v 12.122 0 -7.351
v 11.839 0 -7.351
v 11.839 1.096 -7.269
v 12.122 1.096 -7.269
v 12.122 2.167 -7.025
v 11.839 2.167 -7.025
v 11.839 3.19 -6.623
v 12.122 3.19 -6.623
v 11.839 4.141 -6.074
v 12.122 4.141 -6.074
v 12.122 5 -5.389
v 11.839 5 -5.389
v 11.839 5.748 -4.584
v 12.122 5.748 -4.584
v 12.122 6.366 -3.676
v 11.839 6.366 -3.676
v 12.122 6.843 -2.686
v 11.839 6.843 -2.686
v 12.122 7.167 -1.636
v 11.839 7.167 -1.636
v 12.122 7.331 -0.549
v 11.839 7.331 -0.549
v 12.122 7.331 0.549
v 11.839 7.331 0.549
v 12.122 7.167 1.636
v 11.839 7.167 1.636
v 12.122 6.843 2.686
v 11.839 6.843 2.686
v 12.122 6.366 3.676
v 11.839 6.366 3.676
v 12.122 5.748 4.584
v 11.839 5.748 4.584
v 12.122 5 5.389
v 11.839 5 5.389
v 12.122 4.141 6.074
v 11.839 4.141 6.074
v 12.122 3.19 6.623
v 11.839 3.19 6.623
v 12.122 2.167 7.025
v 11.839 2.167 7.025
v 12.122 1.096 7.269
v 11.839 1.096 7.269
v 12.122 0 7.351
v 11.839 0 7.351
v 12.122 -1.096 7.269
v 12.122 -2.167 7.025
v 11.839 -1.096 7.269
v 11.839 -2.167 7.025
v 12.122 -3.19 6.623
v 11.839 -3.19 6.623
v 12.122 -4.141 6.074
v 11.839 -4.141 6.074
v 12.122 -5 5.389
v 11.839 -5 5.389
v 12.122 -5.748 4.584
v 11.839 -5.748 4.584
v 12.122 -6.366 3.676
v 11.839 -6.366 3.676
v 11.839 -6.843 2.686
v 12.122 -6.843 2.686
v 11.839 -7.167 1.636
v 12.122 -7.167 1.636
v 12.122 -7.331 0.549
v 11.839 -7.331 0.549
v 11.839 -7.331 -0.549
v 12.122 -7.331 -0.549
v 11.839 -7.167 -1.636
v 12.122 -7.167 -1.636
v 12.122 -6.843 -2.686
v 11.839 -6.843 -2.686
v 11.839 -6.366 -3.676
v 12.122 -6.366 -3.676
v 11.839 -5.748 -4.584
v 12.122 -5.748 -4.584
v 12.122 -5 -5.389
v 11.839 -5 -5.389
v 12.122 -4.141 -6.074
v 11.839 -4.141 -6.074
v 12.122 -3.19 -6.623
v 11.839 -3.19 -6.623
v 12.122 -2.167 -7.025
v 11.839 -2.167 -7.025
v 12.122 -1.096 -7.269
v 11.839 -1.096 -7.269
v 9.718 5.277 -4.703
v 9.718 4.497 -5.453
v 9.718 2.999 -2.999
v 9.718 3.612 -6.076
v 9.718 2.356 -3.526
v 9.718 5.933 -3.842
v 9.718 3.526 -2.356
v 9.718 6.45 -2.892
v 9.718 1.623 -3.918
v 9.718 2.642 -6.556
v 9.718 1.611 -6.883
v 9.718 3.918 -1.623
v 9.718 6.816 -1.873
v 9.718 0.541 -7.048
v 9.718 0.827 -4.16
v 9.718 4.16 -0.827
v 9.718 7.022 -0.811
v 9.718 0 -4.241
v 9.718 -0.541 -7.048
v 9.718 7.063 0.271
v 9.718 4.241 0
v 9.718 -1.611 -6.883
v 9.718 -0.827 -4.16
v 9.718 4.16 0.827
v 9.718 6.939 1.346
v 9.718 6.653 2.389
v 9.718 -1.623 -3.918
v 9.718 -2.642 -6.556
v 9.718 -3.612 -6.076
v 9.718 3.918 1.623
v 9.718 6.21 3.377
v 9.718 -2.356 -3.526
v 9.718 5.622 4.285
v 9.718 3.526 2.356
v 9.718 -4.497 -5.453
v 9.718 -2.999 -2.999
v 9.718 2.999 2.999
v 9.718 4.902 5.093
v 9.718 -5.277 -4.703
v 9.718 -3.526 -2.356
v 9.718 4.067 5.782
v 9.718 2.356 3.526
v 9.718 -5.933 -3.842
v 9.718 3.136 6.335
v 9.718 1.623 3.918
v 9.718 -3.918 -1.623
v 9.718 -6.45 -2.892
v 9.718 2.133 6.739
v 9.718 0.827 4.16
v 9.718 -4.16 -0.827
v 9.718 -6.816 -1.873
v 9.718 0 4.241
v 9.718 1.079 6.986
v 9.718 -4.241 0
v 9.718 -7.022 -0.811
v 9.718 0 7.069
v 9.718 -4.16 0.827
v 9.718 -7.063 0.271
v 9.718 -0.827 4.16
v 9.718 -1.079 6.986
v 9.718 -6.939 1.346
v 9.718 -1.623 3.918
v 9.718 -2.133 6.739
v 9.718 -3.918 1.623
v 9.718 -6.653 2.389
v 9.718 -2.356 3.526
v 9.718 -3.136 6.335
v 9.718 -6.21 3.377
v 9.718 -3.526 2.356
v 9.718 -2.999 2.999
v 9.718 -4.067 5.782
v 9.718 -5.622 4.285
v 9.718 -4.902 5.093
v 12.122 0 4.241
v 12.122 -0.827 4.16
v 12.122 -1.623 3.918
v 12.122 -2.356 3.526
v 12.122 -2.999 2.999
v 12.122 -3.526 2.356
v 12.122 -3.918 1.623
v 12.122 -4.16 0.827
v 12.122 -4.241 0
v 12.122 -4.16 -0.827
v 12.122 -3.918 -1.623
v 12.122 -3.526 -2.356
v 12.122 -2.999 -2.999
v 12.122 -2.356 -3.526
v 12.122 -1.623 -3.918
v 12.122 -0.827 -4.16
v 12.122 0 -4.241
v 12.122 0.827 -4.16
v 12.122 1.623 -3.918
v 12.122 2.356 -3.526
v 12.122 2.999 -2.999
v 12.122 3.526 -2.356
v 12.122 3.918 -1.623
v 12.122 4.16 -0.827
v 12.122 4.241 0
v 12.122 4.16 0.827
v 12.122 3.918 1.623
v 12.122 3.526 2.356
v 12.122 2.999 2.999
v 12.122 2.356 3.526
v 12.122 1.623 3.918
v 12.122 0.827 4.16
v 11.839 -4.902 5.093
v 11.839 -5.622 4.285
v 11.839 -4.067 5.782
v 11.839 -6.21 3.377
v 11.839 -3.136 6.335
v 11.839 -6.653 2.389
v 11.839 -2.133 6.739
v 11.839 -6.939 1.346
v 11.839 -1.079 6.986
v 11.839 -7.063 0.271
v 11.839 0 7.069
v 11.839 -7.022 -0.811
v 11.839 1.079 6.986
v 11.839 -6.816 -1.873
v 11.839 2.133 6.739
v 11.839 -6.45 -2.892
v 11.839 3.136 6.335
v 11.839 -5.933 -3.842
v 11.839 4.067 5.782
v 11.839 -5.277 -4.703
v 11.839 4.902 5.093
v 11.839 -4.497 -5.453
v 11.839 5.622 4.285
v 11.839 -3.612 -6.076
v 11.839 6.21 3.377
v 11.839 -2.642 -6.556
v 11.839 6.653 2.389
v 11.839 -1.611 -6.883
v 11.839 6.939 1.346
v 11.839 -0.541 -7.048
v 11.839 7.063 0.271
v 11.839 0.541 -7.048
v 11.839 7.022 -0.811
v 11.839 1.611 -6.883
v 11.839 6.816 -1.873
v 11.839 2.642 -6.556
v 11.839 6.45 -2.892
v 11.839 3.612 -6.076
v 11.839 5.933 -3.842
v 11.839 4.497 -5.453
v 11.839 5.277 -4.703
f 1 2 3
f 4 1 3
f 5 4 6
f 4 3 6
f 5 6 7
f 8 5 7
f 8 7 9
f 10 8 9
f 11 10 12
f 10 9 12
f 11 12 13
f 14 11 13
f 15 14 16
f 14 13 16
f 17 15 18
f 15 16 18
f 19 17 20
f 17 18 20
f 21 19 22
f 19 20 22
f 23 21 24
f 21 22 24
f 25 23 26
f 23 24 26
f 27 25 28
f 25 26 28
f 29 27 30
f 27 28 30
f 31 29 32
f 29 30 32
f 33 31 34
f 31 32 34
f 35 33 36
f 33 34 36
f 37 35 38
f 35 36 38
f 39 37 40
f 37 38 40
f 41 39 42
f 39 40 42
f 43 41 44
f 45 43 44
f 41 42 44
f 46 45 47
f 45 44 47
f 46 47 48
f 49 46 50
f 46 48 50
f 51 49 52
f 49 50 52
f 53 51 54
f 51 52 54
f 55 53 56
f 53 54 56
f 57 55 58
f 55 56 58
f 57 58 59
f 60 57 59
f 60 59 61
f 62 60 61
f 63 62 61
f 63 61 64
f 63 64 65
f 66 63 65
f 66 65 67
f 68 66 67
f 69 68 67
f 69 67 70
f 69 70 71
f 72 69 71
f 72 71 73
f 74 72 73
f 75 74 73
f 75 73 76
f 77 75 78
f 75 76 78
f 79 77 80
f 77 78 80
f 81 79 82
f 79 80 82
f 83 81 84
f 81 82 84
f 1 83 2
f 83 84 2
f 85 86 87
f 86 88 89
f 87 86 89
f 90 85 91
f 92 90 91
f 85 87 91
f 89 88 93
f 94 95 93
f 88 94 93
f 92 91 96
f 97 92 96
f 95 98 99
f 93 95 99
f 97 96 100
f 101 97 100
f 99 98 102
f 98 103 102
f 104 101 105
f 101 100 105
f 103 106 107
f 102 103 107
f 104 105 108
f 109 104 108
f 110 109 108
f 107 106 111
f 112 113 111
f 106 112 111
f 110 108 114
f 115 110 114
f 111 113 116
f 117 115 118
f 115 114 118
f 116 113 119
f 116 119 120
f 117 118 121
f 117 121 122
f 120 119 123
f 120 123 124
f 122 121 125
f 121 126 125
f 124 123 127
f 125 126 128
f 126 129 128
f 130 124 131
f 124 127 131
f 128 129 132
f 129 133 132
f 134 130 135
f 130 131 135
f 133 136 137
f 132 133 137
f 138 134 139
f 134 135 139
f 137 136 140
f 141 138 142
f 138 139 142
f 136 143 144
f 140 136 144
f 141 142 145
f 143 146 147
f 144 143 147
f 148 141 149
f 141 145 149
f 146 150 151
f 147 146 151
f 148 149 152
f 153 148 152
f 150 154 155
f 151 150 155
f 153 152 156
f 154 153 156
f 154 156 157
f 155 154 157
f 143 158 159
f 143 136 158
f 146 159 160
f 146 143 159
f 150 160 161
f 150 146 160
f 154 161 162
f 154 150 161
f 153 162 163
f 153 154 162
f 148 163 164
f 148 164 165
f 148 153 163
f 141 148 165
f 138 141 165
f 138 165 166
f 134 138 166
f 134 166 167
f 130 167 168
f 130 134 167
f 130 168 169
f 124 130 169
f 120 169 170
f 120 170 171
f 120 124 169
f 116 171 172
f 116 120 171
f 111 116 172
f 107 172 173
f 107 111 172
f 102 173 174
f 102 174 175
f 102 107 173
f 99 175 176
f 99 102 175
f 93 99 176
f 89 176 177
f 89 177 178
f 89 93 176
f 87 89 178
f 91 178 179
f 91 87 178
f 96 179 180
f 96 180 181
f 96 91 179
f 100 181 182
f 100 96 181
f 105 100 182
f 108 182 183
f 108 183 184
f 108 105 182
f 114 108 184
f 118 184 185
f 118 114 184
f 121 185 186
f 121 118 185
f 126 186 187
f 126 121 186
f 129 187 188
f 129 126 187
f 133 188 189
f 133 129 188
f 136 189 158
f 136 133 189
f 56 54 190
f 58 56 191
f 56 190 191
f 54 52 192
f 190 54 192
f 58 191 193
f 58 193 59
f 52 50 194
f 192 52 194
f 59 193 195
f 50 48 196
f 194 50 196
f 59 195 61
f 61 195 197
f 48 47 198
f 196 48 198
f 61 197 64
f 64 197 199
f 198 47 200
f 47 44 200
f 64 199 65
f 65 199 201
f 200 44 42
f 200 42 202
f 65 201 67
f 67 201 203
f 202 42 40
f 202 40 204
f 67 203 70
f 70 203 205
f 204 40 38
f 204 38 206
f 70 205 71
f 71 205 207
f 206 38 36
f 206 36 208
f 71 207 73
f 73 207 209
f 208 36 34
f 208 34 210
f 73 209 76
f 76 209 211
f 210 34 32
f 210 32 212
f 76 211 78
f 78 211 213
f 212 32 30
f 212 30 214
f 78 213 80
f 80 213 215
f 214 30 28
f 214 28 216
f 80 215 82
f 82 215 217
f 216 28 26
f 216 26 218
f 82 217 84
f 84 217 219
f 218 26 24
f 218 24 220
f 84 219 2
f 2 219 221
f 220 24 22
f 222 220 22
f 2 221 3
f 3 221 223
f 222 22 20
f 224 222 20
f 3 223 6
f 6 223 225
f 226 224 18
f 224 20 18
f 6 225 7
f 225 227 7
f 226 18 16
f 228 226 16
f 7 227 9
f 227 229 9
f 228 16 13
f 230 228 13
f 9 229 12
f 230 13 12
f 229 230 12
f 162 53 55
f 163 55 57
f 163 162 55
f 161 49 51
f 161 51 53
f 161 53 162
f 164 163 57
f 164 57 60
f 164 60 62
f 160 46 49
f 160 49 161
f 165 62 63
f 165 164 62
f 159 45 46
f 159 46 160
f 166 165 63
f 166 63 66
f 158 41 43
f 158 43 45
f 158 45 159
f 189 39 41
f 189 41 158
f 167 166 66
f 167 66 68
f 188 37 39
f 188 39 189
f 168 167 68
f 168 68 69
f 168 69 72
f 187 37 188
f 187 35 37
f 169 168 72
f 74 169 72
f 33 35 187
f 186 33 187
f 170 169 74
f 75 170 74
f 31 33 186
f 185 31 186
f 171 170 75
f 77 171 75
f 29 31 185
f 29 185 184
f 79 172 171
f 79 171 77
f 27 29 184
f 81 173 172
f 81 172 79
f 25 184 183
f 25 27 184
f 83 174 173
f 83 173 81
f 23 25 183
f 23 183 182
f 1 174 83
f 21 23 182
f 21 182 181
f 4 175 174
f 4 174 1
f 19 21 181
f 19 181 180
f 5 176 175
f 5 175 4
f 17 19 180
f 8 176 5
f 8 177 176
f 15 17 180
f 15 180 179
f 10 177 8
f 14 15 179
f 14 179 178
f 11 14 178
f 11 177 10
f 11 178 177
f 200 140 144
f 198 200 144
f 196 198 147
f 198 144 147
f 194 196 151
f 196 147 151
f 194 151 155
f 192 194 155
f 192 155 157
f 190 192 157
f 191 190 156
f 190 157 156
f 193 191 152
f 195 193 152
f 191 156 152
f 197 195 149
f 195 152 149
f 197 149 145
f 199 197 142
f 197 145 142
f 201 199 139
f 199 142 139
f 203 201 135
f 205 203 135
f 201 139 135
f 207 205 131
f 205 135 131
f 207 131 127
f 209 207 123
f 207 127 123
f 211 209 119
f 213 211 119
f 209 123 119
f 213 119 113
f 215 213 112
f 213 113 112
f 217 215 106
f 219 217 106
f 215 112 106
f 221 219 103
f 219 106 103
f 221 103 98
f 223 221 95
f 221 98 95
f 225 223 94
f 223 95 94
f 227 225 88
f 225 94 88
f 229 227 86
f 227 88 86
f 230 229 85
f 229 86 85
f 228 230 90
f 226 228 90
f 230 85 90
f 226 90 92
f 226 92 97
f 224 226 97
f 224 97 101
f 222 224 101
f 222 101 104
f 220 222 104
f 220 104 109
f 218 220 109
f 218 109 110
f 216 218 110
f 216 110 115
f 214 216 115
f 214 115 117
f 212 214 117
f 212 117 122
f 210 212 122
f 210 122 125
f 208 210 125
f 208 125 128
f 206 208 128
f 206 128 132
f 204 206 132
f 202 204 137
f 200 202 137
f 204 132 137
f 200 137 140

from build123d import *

# Parameters (mm, degrees)
SKETCH1_R           = 63.5
SKETCH1_R_2         = 38.1
BOSS_EXTRUDE1_DEPTH = 19.05
SKETCH2_R           = 66.04
SKETCH2_R_2         = 38.1
BOSS_EXTRUDE2_DEPTH = 2.54
SCALE1_SCALE        = 0.111317254


with BuildPart() as part:
    # Sketch1 → Boss-Extrude1 (new body)
    with BuildSketch(Plane(origin=(0, 0, 0), x_dir=(0, 0, -1), z_dir=(1, 0, 0))):
        with Locations(Location((0, 0, 0), (0, 0, 180))):
            Circle(SKETCH1_R)
        with Locations(Location((0, 0, 0), (0, 0, 180))):
            Circle(SKETCH1_R_2, mode=Mode.SUBTRACT)
    extrude(amount=BOSS_EXTRUDE1_DEPTH)

    # Sketch2 → Boss-Extrude2 (add)
    with BuildSketch(Plane(origin=(19.05, 0, 0), x_dir=(0, 0, -1), z_dir=(1, 0, 0))):
        Circle(SKETCH2_R)
        with Locations(Location((0, 0, 0), (0, 0, 180))):
            Circle(SKETCH2_R_2, mode=Mode.SUBTRACT)
    extrude(amount=BOSS_EXTRUDE2_DEPTH)


with BuildPart() as part_1:
    # Scale1: scaled about (10.935763547, 0, 0)
    add(part.part.scale(SCALE1_SCALE).moved(Location((9.718424377, 0, 0))))


solid = part_1.part
